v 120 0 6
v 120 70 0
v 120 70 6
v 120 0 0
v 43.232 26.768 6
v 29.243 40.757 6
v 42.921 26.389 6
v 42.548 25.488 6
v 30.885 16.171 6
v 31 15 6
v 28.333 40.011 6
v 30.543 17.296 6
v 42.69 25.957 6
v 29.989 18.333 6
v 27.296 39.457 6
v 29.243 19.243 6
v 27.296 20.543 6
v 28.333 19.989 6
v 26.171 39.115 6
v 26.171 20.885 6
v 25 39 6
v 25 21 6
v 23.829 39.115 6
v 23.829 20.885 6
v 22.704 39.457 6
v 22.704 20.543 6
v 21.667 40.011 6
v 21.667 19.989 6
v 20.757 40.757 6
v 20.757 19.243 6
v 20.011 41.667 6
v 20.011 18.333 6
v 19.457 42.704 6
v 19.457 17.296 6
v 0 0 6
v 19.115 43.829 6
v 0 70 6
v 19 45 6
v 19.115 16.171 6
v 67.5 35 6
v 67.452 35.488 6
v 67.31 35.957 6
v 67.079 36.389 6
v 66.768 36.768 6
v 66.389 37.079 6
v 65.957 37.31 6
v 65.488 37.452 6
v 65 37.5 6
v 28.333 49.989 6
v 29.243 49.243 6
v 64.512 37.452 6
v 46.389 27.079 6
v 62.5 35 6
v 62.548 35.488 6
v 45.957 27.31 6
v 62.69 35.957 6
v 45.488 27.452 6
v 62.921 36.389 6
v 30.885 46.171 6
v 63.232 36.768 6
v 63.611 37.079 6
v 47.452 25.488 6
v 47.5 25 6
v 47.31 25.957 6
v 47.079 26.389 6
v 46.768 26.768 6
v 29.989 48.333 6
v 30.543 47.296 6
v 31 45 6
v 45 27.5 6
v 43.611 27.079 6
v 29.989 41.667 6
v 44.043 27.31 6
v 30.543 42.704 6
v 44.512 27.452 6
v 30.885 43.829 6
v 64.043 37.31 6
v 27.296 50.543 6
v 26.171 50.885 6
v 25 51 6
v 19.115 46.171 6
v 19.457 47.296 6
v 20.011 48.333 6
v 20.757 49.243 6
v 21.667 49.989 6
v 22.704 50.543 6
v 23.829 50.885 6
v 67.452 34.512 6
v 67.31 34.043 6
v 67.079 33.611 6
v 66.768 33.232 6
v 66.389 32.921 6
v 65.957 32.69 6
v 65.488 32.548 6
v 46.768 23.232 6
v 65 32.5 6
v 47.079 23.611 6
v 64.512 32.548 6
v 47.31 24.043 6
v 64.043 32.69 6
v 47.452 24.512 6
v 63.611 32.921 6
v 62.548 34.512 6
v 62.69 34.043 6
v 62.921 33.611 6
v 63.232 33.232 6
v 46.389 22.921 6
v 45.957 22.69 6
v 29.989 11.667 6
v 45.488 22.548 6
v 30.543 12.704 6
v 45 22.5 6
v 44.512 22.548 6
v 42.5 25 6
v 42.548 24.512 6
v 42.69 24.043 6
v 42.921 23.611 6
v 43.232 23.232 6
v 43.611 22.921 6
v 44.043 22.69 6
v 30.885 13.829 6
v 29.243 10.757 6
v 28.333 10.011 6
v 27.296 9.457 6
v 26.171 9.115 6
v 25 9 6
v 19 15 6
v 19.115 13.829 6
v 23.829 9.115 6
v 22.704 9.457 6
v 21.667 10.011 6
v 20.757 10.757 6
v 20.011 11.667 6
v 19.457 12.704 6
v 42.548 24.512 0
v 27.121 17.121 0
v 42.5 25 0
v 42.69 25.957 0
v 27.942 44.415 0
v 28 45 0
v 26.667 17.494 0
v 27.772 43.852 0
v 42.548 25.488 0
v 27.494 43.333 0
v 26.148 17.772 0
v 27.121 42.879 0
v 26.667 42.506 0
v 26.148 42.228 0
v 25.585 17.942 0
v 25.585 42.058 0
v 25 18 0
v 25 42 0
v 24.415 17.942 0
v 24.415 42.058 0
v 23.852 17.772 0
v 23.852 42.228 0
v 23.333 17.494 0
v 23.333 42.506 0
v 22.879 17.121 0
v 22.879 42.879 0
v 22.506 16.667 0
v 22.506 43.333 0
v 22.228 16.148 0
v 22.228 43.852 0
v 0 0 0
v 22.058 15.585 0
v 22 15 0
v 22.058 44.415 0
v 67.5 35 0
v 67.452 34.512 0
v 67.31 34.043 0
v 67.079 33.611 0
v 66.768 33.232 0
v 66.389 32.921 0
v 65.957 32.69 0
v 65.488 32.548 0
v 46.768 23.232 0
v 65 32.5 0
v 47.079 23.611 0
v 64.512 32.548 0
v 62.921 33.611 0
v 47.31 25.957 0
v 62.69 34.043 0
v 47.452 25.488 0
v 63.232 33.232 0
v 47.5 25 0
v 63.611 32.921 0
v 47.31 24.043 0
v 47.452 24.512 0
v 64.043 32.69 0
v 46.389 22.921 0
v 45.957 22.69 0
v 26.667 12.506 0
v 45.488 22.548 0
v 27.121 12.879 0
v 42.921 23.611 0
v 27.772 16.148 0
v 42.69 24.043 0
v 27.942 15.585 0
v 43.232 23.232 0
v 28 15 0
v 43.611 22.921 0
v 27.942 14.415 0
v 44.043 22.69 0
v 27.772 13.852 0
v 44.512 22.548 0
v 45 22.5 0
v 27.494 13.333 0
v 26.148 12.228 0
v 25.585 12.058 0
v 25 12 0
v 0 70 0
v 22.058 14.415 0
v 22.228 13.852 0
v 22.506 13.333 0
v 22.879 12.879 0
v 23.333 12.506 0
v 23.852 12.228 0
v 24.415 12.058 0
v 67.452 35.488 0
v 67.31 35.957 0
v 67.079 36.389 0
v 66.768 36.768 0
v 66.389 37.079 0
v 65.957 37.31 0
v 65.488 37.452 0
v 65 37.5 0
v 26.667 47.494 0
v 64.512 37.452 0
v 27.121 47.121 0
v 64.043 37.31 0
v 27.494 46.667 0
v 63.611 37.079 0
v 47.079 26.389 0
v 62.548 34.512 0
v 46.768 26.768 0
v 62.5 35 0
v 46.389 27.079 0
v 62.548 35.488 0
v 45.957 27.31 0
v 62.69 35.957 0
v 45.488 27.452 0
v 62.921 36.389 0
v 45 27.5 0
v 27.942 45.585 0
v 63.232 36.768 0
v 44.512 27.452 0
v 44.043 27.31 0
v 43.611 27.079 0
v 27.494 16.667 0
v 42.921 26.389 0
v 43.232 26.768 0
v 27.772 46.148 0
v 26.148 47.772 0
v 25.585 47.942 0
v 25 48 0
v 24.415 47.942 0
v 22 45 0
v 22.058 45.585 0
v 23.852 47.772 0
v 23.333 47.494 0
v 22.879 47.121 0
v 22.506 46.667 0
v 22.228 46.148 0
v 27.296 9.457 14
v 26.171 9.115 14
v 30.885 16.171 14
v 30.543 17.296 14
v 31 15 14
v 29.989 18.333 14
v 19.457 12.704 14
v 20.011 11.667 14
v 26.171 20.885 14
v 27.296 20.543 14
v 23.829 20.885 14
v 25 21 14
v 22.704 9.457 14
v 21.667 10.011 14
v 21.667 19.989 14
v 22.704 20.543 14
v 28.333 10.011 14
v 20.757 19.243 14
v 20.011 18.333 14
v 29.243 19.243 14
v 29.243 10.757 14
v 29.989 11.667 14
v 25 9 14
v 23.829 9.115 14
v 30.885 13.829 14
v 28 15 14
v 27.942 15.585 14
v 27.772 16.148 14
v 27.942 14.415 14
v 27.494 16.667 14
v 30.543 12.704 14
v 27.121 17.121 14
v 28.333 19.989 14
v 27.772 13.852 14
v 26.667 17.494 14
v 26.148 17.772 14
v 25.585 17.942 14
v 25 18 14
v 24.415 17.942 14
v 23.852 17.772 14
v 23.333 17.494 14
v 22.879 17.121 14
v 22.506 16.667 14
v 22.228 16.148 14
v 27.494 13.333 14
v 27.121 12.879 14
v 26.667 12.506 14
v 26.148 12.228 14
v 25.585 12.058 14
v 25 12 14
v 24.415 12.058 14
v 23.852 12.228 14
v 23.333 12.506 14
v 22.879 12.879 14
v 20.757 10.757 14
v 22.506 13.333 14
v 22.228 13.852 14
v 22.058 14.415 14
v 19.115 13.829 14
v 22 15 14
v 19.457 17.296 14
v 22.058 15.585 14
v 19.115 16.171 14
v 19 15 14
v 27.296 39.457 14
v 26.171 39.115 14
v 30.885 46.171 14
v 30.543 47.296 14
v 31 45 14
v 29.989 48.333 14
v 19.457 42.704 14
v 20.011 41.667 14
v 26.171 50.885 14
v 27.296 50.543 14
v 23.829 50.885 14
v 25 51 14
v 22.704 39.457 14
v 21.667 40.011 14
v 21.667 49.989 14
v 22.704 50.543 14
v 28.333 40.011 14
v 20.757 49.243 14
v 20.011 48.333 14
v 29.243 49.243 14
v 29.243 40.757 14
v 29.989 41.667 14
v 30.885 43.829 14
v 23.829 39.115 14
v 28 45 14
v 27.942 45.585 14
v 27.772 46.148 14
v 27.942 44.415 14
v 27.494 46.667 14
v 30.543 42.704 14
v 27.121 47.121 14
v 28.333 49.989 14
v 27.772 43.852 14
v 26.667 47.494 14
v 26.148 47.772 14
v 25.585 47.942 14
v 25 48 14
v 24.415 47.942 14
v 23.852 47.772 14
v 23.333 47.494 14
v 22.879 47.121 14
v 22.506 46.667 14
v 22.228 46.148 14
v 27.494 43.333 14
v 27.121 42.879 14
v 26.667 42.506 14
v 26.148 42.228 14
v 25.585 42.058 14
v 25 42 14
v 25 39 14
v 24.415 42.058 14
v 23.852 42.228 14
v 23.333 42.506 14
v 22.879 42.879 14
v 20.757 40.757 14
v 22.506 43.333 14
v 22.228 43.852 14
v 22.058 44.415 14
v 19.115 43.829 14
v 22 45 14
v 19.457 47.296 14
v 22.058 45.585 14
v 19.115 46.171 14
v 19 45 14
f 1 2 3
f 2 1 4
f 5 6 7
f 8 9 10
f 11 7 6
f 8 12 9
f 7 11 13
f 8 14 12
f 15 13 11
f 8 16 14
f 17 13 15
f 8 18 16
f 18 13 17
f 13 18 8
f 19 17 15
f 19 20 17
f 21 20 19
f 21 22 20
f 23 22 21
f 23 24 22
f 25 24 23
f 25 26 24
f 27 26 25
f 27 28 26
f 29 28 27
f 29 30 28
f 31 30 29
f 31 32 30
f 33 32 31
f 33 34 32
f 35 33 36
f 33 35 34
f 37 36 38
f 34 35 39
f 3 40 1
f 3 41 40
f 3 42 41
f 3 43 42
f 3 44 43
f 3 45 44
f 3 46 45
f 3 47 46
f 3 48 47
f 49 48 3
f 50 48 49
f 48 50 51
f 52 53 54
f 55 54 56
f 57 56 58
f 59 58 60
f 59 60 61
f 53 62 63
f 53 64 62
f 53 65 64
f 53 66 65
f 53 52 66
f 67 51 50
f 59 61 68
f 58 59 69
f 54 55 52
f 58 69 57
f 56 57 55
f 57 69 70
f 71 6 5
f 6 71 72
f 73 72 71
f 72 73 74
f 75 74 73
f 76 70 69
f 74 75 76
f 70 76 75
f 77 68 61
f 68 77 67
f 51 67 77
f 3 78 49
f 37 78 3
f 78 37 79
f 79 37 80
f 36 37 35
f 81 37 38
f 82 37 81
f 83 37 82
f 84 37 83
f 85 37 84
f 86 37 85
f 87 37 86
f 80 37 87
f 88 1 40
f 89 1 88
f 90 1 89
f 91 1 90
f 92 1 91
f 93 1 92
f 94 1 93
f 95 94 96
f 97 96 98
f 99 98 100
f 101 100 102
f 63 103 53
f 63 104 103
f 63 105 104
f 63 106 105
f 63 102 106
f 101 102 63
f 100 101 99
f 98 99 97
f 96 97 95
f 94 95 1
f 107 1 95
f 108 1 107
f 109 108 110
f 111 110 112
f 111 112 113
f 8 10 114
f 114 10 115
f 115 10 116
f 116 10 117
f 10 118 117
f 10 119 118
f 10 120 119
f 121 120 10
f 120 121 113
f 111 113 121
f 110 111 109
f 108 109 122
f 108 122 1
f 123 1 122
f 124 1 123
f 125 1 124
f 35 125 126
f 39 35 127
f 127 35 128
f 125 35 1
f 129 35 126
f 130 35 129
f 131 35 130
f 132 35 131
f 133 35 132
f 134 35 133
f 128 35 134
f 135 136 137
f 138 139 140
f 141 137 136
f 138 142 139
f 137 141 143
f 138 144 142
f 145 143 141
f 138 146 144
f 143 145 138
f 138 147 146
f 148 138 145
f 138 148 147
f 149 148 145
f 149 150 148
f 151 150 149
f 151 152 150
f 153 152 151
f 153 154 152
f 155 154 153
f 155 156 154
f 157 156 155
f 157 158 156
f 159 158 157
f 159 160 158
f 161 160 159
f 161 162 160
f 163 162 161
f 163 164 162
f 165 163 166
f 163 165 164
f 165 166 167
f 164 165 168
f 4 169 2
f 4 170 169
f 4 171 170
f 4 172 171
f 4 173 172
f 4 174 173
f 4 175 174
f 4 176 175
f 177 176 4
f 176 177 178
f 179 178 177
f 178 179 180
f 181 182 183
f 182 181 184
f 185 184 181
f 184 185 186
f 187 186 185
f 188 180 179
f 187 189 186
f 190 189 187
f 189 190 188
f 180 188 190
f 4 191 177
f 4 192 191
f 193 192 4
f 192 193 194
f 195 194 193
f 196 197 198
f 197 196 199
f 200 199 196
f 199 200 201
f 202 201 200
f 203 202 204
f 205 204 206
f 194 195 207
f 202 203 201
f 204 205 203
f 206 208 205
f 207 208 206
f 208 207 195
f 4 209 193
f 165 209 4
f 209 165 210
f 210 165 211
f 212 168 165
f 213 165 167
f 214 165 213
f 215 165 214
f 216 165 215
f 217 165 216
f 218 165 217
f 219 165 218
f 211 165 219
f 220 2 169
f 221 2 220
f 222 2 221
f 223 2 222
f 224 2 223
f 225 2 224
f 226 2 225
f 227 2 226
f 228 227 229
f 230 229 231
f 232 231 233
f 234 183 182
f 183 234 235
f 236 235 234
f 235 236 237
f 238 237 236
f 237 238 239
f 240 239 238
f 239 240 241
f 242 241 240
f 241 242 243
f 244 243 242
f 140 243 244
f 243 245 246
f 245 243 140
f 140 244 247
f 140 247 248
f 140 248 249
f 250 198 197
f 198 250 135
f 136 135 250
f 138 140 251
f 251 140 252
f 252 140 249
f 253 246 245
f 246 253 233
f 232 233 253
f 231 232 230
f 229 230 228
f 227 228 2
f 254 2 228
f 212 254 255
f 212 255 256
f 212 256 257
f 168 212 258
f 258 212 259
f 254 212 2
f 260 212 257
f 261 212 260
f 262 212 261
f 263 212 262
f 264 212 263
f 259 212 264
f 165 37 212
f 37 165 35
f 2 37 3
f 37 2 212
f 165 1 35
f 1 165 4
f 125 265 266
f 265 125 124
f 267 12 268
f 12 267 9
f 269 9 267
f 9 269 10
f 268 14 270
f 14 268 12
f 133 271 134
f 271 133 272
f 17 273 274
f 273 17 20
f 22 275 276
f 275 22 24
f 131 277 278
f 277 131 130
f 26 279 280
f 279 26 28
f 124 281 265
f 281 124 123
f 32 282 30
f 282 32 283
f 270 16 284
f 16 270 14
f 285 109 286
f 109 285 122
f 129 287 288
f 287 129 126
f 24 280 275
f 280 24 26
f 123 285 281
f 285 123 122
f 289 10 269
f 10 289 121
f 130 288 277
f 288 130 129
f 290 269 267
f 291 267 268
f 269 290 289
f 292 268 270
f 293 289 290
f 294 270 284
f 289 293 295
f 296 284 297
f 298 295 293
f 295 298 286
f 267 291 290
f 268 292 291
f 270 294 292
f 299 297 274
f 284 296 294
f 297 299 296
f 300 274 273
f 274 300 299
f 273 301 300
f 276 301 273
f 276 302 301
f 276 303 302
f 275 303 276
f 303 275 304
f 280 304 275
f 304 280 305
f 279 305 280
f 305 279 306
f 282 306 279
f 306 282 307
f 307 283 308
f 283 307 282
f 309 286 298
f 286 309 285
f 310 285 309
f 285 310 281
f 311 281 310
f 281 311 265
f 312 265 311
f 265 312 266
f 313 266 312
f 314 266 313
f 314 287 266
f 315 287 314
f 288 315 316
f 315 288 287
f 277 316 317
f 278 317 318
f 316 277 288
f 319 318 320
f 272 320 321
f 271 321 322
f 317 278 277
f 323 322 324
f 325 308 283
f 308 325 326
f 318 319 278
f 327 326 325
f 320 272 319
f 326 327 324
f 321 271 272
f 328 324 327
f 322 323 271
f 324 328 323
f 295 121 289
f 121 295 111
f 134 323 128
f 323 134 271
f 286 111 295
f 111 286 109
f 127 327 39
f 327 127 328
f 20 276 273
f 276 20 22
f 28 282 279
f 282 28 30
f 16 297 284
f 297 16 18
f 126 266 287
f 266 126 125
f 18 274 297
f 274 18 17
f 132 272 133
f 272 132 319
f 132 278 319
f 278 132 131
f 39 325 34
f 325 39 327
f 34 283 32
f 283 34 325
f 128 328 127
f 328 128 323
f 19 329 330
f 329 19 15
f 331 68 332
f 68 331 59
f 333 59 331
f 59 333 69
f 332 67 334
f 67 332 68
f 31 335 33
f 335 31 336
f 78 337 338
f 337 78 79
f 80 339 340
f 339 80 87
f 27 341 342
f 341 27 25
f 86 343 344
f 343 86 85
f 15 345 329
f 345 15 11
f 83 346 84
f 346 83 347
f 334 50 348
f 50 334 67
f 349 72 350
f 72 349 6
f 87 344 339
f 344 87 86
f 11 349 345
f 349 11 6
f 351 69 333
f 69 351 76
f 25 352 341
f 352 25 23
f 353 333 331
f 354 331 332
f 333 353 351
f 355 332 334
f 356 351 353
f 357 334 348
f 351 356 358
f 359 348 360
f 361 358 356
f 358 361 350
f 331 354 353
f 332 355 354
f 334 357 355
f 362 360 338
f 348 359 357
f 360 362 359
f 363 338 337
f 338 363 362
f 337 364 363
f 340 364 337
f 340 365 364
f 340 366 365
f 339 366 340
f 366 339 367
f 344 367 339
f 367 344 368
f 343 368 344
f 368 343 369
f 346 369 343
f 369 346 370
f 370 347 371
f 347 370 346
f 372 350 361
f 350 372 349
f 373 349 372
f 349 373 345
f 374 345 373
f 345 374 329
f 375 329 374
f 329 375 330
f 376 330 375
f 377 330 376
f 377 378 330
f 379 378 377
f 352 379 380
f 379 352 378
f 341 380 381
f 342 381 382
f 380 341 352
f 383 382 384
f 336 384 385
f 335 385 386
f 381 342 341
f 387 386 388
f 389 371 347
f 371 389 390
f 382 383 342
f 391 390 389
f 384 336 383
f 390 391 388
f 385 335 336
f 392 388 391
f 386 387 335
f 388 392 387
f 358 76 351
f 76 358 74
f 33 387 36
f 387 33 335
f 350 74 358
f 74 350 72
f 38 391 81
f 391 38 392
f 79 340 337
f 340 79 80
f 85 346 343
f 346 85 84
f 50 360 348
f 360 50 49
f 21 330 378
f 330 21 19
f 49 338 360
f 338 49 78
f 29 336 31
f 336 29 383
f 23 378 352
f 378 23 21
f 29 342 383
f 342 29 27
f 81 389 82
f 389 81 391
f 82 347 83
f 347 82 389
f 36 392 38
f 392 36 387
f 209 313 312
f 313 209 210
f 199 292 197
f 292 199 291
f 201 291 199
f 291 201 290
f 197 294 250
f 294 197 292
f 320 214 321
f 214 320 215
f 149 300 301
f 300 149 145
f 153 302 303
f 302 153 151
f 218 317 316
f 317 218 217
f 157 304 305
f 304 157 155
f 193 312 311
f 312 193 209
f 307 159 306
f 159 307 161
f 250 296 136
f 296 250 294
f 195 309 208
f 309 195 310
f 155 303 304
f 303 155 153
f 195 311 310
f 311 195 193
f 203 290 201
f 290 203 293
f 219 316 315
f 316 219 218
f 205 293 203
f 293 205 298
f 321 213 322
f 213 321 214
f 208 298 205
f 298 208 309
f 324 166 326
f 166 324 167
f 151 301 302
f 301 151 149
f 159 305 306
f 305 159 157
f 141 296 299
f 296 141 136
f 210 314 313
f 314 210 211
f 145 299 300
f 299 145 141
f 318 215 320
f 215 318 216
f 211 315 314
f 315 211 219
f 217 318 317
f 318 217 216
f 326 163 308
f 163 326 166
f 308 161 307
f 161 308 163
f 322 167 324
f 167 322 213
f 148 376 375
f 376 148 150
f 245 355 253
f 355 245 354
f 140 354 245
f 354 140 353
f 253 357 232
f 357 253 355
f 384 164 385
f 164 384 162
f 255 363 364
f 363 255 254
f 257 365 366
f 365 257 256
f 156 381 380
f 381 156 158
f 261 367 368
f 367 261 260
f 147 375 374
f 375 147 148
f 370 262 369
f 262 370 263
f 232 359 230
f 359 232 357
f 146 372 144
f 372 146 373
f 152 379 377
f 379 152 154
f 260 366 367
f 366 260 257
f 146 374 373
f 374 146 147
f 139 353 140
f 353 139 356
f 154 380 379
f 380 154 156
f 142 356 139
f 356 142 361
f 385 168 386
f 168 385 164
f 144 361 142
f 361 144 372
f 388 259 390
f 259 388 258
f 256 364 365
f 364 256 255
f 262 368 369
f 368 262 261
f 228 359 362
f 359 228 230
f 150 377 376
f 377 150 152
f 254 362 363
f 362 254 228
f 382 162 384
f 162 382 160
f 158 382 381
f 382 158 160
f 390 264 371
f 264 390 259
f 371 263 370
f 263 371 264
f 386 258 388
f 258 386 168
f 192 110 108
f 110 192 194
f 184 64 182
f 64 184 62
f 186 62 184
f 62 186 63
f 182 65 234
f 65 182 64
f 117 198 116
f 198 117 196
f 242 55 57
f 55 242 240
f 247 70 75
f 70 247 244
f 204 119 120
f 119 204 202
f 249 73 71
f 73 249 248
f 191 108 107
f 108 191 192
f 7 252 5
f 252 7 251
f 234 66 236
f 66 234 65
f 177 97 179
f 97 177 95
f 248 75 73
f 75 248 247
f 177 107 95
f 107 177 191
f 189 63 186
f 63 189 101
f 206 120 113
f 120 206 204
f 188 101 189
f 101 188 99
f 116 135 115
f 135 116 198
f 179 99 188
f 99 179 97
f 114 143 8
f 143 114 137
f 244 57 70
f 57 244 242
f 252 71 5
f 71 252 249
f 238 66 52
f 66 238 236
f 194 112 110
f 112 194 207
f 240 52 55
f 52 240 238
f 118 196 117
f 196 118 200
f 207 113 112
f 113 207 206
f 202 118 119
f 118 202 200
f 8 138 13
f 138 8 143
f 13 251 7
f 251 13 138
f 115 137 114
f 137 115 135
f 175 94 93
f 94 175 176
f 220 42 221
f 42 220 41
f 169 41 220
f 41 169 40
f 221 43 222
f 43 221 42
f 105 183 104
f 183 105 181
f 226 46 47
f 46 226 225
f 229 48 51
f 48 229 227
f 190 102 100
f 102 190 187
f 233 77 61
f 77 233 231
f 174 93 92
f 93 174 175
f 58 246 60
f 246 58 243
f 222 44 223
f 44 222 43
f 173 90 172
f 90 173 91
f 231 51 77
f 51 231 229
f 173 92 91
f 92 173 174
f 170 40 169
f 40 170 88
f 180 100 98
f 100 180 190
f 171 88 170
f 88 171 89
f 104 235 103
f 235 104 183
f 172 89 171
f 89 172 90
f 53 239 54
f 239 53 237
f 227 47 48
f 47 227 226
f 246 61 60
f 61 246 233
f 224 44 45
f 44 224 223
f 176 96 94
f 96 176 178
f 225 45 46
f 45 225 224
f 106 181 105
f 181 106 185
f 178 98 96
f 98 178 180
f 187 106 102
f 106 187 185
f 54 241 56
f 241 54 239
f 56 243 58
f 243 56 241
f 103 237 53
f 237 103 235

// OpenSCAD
$fn = 32;

// ----------------------------------------------------------------------
// Mixed field: bosses and holes at given coordinates
// ----------------------------------------------------------------------

// --- parameters (mm) ---
plate_l = 120;            // plate length, X
plate_w = 70;             // plate width, Y
plate_t = 6;              // plate thickness, Z
boss_d = 12;              // boss diameter
boss_h = 8;               // boss height above the plate
hole_d = 5;               // through hole diameter

total_h = plate_t + boss_h;  // overall height

difference() {
  union() {
    cube([plate_l, plate_w, plate_t]);
    translate([25, 15, plate_t]) cylinder(h = boss_h, d = boss_d);
    translate([25, 45, plate_t]) cylinder(h = boss_h, d = boss_d);
  }
  translate([25, 15, -1]) cylinder(h = total_h + 2, d = boss_d / 2);
  translate([25, 45, -1]) cylinder(h = total_h + 2, d = boss_d / 2);
  translate([45, 25, -1]) cylinder(h = plate_t + 2, d = hole_d);
  translate([65, 35, -1]) cylinder(h = plate_t + 2, d = hole_d);
}
